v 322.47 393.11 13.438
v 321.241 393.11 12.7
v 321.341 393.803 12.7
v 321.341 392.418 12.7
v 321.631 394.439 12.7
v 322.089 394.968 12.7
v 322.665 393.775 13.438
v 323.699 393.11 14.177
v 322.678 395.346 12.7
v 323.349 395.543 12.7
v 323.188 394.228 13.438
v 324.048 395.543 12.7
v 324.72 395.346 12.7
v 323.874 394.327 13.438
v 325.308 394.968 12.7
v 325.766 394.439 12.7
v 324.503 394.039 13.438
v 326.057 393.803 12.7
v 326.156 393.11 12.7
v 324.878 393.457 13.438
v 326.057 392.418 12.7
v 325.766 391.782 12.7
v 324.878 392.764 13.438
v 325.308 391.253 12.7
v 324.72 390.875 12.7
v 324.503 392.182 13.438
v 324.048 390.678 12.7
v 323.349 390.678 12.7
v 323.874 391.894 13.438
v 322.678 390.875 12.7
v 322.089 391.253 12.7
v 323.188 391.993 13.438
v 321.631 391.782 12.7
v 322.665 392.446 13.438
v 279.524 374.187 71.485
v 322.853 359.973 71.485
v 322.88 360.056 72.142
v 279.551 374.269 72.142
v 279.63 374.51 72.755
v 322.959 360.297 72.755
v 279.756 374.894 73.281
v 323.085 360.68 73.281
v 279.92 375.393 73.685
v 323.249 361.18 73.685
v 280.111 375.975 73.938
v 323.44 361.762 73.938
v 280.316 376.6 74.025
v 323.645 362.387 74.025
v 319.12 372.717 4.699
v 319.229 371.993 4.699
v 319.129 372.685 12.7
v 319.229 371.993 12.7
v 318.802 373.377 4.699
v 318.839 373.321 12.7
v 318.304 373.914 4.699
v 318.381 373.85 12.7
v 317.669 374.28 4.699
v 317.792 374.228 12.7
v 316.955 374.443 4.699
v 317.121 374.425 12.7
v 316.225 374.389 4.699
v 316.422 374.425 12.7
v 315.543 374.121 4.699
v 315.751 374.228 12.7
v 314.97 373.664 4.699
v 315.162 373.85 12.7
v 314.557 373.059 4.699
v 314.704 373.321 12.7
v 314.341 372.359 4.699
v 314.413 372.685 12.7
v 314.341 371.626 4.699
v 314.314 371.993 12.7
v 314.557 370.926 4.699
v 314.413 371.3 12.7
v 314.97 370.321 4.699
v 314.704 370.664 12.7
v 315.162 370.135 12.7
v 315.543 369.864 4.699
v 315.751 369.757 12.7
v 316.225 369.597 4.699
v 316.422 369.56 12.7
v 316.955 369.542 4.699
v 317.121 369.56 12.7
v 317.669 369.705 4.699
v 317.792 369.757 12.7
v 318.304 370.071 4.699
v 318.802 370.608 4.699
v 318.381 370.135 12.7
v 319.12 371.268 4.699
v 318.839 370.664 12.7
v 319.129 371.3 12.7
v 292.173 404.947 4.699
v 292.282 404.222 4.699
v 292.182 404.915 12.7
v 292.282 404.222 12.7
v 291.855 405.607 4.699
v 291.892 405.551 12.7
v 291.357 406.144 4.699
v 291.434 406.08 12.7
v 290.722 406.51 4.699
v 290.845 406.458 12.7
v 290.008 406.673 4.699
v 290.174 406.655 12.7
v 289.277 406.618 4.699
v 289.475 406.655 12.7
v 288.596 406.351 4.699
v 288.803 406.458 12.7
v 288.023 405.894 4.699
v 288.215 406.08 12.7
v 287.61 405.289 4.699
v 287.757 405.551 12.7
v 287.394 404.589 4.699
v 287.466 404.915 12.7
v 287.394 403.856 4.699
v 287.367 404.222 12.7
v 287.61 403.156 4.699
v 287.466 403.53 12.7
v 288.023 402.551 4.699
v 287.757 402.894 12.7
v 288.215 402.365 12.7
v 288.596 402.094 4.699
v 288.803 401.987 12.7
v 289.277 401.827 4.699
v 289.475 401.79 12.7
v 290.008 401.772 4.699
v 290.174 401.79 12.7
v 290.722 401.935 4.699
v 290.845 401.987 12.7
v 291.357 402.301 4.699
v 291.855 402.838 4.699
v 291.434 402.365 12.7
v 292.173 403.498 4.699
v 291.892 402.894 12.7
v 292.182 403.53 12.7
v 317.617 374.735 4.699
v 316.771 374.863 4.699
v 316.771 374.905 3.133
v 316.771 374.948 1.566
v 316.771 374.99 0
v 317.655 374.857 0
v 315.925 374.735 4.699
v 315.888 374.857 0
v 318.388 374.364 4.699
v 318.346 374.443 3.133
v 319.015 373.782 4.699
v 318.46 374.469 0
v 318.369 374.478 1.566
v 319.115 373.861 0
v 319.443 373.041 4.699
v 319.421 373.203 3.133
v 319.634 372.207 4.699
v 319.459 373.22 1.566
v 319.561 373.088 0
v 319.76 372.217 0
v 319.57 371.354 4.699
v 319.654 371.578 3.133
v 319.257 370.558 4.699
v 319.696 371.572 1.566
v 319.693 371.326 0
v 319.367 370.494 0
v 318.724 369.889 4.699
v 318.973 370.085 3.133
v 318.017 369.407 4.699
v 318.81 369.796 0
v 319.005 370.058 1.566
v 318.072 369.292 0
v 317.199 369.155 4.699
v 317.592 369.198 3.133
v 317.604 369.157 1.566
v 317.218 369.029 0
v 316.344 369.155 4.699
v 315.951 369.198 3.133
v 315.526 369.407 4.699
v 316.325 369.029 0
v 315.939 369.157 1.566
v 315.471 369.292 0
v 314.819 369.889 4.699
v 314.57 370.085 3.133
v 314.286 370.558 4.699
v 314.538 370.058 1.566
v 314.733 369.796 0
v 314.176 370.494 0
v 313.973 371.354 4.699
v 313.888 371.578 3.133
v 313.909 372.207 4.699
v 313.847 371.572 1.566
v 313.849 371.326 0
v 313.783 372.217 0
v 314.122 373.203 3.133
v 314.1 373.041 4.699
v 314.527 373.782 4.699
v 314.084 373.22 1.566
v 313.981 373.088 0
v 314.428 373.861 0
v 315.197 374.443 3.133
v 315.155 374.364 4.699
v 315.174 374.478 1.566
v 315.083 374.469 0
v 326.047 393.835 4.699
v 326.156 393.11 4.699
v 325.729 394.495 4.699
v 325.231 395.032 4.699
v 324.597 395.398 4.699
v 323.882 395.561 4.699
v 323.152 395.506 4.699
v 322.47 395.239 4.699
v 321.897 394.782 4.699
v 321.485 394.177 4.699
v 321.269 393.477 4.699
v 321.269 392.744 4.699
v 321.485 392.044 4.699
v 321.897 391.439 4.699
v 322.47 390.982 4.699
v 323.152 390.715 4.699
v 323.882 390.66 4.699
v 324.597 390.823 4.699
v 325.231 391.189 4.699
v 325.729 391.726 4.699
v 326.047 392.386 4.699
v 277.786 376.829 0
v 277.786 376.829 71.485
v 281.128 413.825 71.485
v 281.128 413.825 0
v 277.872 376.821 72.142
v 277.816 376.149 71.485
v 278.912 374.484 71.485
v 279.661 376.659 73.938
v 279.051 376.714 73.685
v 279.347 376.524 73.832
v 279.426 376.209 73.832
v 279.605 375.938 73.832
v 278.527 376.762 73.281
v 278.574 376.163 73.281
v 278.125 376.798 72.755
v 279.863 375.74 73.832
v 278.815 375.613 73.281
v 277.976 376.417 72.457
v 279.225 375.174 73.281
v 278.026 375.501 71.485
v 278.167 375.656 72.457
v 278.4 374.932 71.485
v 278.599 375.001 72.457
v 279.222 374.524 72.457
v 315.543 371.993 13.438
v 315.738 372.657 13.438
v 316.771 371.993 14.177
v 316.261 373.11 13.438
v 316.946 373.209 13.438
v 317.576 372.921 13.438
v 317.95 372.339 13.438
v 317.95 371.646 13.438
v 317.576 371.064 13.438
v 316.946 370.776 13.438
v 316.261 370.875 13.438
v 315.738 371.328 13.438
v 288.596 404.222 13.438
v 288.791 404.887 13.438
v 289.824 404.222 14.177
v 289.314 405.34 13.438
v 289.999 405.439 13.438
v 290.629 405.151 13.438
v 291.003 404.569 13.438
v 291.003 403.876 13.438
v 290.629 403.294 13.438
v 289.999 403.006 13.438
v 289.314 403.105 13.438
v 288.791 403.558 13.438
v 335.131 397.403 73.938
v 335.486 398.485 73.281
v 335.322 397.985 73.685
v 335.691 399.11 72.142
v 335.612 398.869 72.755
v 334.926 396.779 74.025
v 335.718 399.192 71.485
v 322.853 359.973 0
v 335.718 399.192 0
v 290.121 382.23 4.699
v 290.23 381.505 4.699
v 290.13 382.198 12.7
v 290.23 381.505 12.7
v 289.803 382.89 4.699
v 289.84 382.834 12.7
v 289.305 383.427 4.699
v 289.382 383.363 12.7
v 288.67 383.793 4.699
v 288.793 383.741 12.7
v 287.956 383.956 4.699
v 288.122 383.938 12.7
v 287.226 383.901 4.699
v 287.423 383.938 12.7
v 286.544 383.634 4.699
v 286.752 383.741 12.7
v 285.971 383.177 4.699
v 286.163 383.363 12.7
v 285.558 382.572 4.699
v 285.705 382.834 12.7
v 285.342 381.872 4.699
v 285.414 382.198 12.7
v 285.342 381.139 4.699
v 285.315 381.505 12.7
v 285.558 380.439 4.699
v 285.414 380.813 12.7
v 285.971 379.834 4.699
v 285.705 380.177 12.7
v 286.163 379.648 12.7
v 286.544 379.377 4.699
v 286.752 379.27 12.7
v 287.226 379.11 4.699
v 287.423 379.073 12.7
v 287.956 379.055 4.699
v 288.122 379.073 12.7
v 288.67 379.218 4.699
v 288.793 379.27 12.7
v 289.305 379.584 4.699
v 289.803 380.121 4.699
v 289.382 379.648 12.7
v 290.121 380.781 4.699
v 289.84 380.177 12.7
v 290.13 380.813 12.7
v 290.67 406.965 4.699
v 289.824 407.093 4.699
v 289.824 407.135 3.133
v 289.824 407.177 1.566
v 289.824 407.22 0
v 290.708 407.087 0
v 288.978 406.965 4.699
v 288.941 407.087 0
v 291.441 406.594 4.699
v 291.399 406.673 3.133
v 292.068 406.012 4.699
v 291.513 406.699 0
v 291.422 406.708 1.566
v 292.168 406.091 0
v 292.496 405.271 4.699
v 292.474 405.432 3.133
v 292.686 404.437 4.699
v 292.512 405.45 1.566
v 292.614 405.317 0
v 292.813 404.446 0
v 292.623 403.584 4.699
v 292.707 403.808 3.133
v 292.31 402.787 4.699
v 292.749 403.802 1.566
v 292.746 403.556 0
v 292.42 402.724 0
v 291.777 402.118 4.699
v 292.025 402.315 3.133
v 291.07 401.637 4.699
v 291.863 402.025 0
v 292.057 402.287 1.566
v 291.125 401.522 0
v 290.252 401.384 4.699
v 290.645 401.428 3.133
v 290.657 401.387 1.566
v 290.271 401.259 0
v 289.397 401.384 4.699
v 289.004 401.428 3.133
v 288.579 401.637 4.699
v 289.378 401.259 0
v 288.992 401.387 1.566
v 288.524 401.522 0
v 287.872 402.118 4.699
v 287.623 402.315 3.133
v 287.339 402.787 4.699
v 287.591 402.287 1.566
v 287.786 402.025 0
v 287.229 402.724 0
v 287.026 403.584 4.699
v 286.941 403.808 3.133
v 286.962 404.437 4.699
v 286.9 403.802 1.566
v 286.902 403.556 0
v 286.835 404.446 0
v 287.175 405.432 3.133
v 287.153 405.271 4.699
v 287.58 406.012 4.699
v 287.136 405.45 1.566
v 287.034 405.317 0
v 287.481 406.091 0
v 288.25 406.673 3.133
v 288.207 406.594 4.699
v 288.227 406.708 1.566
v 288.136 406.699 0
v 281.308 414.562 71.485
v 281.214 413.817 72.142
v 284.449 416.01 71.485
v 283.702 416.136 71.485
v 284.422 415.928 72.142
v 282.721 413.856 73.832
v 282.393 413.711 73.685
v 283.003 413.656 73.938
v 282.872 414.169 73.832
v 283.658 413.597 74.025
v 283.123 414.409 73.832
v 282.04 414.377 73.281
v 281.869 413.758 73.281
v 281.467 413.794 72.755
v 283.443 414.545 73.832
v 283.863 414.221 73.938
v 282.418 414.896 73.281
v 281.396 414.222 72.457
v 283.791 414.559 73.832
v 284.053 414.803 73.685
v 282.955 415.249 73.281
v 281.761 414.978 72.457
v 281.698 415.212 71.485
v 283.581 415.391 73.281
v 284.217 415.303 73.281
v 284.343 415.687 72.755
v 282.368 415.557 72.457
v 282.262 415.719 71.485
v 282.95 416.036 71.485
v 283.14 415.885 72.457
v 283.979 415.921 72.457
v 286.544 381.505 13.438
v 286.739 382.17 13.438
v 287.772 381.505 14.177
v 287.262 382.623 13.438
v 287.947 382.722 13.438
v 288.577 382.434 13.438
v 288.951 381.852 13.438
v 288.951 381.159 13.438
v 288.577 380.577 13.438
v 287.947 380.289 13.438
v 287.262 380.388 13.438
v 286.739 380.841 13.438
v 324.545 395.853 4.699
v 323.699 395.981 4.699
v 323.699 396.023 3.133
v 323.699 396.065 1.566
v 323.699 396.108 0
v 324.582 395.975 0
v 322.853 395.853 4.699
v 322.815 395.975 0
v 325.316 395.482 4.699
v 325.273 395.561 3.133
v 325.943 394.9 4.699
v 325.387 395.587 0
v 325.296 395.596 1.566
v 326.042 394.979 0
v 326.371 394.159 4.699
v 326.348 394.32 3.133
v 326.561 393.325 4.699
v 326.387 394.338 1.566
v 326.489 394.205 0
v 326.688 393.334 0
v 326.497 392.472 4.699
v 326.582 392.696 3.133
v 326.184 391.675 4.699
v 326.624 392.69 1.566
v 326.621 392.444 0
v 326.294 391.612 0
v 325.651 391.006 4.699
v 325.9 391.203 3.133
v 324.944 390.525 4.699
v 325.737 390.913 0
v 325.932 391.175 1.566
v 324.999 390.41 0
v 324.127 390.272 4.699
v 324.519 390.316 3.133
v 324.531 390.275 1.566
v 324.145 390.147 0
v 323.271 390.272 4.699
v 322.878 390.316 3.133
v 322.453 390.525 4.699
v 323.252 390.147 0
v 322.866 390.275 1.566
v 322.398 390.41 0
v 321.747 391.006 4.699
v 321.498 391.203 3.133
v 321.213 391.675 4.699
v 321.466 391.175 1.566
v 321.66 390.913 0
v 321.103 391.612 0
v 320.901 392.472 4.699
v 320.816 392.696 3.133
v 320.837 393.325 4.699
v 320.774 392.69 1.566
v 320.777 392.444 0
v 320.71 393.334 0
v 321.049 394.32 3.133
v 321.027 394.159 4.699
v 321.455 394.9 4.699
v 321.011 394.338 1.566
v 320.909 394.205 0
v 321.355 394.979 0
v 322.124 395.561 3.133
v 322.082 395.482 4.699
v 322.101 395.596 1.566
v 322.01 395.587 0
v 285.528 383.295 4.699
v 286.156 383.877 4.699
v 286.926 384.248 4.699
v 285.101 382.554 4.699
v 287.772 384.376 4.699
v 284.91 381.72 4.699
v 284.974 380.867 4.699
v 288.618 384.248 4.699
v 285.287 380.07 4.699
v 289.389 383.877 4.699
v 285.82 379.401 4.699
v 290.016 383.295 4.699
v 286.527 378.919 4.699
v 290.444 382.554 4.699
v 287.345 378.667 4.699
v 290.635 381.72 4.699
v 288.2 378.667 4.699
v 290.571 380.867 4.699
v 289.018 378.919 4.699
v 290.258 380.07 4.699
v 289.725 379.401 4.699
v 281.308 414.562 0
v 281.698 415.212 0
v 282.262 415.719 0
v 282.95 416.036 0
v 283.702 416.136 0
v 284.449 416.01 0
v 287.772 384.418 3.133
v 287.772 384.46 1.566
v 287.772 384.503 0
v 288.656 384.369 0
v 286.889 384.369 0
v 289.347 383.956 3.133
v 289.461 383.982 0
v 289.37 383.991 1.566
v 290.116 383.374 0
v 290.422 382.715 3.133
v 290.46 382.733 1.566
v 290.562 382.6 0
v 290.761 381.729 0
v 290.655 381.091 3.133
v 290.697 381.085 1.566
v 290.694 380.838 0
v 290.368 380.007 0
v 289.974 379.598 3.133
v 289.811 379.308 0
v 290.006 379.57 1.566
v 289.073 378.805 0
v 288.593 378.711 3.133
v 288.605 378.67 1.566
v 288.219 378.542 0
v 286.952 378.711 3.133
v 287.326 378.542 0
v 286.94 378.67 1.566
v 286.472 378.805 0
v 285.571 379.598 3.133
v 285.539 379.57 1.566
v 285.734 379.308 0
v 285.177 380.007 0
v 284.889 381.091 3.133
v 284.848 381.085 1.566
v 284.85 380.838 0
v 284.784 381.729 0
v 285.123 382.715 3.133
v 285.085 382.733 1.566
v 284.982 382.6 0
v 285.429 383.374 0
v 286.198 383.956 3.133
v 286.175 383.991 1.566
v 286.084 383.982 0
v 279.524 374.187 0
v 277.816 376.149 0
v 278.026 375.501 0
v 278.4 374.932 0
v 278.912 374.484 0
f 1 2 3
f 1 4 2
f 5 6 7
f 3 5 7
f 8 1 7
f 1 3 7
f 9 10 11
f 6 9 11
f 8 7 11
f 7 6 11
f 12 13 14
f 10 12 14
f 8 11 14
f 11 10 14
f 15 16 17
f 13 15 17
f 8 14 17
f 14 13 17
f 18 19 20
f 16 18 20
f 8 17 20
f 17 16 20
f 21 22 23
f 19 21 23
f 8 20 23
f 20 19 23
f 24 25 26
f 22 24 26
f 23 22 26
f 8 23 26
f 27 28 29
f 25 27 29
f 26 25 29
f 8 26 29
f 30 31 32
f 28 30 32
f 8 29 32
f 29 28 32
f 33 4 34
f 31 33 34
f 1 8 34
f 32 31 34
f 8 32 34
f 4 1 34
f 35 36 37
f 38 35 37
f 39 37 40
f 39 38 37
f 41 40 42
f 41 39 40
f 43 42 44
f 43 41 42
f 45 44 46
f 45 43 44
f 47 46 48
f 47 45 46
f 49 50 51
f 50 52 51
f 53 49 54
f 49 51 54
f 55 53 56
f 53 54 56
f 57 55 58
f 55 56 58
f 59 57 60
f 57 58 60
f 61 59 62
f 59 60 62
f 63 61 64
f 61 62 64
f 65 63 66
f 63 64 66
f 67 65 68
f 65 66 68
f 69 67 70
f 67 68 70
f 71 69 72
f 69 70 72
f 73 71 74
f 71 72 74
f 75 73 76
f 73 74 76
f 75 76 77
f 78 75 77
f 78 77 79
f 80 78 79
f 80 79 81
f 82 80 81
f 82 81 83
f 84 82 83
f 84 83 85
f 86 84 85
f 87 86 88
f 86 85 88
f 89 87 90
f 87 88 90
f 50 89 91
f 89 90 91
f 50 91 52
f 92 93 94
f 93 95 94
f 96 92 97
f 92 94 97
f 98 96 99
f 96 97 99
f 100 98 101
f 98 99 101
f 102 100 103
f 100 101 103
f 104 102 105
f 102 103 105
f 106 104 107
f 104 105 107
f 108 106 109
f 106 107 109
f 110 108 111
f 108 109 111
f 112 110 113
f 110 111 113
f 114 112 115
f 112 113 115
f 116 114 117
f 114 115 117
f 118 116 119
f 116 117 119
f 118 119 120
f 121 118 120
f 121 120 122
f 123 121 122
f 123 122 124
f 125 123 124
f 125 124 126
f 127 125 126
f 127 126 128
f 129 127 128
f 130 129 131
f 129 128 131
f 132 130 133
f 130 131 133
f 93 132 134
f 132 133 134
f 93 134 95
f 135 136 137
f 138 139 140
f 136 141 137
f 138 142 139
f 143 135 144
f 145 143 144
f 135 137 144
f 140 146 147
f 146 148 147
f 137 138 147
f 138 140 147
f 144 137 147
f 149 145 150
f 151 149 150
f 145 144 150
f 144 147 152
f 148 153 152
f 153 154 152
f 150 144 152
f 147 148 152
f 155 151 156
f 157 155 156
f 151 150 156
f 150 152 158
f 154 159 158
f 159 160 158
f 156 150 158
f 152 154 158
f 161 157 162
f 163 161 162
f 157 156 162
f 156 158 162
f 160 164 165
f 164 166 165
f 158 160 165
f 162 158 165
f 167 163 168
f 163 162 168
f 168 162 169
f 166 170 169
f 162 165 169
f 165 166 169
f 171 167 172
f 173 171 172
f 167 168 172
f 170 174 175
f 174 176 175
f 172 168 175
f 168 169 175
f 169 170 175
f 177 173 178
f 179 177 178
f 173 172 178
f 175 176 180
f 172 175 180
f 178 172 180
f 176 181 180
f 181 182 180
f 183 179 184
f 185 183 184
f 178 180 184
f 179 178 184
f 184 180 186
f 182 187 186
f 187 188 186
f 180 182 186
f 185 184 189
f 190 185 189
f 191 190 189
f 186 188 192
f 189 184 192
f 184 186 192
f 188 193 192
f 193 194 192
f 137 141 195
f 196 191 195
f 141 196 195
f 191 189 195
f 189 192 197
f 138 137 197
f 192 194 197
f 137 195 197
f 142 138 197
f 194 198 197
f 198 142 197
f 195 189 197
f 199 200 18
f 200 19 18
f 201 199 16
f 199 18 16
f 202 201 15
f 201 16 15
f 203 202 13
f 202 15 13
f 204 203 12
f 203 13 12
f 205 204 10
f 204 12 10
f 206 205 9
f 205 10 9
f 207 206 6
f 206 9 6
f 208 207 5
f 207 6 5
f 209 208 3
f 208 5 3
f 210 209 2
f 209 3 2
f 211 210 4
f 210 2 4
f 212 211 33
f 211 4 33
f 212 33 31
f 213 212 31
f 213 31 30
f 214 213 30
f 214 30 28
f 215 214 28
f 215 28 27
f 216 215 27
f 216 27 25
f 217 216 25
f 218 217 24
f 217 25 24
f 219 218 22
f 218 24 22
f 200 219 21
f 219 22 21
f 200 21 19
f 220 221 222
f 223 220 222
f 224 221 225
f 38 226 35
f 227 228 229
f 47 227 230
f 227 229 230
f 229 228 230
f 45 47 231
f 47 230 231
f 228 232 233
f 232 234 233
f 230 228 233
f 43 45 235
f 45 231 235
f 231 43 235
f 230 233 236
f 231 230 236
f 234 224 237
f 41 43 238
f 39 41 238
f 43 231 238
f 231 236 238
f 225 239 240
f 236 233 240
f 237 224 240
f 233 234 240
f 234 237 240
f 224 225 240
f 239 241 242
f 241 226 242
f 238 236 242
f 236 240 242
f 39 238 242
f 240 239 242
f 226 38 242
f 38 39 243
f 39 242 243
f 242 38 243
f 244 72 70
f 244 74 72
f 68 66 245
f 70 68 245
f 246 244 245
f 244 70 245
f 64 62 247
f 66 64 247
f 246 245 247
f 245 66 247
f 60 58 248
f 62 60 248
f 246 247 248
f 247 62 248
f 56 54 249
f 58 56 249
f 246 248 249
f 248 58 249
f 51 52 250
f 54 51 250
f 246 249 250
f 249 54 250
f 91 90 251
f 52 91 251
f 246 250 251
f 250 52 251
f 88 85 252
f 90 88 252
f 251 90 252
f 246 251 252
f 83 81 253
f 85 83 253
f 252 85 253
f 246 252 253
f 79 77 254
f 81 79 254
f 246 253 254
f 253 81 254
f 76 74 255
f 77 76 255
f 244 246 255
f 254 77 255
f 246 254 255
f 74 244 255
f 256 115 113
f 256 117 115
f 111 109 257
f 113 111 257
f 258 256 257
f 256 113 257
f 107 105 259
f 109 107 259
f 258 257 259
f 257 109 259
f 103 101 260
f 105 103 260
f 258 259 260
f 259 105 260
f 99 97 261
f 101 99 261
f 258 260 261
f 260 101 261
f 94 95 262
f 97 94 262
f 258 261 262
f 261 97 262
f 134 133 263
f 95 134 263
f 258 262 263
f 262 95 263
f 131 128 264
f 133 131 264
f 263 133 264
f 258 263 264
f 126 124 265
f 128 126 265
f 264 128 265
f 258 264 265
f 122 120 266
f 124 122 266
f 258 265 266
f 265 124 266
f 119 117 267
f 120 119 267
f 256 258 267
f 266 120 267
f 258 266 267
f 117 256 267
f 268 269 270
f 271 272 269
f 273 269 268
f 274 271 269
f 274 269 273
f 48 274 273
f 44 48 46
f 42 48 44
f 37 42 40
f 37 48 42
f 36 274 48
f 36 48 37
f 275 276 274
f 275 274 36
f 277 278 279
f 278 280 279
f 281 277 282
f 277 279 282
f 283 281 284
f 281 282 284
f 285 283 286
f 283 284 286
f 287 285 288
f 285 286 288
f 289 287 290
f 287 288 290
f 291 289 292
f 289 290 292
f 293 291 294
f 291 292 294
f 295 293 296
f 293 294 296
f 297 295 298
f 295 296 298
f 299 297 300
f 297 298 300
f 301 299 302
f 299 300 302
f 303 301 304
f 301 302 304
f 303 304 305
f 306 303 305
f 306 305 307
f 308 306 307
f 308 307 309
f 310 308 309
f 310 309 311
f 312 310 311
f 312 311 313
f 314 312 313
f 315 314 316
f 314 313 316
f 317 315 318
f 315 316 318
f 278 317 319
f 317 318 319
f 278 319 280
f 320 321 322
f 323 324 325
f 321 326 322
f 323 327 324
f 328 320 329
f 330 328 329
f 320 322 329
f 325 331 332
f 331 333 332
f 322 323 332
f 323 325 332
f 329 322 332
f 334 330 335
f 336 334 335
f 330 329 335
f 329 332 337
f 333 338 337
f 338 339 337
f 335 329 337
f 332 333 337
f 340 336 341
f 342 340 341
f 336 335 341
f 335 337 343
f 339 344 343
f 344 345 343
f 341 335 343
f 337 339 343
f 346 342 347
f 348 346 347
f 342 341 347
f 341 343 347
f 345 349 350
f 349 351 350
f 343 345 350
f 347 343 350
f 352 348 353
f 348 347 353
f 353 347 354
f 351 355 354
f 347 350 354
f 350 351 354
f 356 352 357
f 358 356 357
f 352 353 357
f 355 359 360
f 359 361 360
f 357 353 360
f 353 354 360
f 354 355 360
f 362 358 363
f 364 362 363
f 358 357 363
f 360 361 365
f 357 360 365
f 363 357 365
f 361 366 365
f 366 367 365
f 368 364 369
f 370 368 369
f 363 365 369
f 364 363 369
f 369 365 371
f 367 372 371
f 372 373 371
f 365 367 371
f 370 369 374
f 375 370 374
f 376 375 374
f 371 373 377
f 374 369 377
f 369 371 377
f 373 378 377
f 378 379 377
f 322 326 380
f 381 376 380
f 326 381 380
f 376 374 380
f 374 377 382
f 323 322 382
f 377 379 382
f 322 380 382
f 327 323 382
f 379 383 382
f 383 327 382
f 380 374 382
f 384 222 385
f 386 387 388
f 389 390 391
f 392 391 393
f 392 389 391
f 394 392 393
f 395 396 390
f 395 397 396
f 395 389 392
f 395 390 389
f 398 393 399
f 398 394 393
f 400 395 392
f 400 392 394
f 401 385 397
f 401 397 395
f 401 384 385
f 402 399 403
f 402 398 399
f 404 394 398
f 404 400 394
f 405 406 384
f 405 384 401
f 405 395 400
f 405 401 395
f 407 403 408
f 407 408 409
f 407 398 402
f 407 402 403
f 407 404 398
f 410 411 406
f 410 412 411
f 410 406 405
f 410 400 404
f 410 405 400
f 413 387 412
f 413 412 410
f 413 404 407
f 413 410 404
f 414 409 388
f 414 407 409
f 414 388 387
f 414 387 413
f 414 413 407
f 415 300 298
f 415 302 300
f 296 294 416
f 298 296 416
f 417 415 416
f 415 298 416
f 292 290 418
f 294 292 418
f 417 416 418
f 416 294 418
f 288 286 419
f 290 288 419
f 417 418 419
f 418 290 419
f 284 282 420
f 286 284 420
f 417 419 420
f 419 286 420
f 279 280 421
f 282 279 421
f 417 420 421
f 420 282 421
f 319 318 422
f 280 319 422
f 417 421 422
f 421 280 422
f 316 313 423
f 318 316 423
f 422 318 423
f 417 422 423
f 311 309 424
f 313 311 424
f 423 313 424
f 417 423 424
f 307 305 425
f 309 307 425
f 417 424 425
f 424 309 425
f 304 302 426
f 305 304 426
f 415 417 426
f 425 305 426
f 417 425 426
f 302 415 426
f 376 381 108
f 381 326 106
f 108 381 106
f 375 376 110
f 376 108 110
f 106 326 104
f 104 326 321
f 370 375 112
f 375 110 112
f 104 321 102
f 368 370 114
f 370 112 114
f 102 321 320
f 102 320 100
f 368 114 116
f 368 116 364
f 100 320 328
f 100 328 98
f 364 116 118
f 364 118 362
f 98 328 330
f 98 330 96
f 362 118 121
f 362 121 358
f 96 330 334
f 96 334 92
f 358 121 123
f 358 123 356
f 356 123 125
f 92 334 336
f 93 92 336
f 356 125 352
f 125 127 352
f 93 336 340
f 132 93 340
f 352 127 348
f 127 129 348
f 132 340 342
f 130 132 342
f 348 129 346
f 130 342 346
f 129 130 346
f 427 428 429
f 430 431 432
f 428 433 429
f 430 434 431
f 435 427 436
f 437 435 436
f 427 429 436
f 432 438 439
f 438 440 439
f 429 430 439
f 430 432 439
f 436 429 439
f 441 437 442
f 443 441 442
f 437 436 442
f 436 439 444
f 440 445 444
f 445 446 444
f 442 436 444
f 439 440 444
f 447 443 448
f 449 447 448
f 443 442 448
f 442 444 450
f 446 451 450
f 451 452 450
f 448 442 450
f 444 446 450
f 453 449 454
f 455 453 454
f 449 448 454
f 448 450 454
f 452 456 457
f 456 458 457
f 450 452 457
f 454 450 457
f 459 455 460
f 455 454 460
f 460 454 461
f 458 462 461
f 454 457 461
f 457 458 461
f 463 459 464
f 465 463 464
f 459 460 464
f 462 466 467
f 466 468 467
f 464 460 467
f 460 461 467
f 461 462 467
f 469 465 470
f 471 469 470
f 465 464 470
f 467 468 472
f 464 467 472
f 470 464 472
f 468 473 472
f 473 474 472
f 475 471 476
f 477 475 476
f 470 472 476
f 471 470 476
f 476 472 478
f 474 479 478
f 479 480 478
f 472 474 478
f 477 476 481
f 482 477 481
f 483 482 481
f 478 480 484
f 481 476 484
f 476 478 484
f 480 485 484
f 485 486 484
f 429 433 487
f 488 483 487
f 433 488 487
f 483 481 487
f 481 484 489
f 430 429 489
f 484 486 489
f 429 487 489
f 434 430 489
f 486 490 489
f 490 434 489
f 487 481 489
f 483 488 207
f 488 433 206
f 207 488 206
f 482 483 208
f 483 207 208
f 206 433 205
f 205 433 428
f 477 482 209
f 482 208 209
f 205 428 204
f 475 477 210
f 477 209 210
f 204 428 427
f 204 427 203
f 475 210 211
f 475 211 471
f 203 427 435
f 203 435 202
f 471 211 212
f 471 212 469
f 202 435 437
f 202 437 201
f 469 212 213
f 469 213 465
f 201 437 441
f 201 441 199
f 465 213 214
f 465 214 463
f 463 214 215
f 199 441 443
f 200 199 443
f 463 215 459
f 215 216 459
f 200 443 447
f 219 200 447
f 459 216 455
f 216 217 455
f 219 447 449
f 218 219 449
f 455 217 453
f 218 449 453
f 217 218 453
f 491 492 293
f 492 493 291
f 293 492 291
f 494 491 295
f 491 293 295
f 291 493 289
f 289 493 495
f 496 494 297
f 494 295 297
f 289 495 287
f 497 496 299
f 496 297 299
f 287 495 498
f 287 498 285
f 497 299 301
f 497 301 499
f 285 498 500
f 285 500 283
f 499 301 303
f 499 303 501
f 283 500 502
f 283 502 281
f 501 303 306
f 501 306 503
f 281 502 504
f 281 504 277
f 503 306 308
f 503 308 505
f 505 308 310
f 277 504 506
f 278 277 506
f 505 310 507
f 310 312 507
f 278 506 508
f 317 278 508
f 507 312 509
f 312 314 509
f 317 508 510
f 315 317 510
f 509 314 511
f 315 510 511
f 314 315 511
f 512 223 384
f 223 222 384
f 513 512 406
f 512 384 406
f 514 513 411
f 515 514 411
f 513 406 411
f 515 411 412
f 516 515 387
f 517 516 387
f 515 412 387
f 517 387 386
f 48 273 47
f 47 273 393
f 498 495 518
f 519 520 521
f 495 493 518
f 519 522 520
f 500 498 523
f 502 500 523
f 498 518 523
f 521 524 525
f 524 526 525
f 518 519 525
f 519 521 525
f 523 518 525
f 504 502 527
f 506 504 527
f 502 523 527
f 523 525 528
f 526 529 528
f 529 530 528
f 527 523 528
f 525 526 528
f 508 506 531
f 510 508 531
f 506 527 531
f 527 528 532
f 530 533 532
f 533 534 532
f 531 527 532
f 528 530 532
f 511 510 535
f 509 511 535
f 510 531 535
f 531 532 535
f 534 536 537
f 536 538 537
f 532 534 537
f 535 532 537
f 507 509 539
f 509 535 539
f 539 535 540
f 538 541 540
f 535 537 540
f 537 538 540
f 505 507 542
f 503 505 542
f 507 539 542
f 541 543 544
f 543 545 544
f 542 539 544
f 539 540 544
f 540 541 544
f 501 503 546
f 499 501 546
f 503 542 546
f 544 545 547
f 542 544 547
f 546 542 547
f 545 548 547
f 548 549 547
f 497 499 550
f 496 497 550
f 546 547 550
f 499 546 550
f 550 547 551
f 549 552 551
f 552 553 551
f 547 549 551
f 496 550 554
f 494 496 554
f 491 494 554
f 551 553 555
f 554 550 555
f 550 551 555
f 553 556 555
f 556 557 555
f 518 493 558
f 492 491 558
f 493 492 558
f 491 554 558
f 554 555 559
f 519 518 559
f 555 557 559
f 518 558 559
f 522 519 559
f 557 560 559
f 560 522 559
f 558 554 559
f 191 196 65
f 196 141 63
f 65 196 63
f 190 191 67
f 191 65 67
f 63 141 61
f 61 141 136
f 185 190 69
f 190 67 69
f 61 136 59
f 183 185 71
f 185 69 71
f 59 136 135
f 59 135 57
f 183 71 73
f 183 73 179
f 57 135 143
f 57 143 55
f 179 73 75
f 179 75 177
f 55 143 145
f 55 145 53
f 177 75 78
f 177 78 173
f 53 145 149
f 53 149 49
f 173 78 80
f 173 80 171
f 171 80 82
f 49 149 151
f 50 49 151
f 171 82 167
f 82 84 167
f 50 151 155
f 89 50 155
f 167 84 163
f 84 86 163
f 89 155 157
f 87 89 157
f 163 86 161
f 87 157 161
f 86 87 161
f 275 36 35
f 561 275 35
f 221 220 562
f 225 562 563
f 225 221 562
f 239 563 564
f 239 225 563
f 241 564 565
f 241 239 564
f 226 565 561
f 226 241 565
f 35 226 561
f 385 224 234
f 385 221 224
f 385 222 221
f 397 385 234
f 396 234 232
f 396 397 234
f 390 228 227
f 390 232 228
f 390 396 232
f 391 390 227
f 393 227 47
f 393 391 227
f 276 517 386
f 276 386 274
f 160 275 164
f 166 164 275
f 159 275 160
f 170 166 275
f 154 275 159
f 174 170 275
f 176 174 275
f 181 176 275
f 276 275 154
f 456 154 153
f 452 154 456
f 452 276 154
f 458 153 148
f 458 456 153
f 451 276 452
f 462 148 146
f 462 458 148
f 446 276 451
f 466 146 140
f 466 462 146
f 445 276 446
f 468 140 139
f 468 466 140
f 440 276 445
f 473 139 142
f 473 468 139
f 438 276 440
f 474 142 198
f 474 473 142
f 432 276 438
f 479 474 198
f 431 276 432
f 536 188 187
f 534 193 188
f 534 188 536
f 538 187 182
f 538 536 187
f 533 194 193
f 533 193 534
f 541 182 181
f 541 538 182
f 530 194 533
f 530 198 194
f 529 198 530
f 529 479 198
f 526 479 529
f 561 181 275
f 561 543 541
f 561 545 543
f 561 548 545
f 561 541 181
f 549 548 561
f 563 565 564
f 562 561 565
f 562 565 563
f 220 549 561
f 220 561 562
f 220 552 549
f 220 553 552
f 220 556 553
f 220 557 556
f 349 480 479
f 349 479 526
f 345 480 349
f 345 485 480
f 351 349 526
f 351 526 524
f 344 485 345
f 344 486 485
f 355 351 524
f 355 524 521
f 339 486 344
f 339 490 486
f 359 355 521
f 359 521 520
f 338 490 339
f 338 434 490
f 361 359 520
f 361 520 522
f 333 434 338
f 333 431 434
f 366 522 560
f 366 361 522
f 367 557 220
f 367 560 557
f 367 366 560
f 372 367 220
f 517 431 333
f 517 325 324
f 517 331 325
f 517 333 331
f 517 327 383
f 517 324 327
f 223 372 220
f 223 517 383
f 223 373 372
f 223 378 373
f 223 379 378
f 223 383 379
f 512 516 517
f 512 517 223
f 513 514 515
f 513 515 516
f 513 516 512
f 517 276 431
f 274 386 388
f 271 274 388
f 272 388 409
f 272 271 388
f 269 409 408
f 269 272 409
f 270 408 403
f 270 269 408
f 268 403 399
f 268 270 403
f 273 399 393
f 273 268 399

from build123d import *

# Parameters (mm, degrees)
BOSS_EXTRUDE1_DEPTH       = 74.025
FILLET1_R                 = 2.54
HOLE1_AT_2_COUNT          = 2
HOLE1_AT_2_PITCH          = 35.650433853
HOLE1_AT_3_COUNT          = 2
HOLE1_AT_3_PITCH          = 37.7542539
HOLE1_AT_4_COUNT          = 2
HOLE1_AT_4_PITCH          = 22.225
F_8_CLEARANCE_HOLE1_D     = 4.9149
F_8_CLEARANCE_HOLE1_DEPTH = 12.7
F_8_CLEARANCE_HOLE1_TIP   = 1.476584928


with BuildPart() as part:
    # Sketch1 → Boss-Extrude1 (new body)
    with BuildSketch(Plane.XY):
        Polygon((277.604402796, 374.816405204), (281.415155825, 417.005352091), (335.71810759, 399.192100573), (322.852981494, 359.973302076), align=None)
    extrude(amount=BOSS_EXTRUDE1_DEPTH)

    # Fillet1
    fillet1_edges = [part.edges().sort_by_distance(p)[0] for p in [
        (281.415155825, 417.005352091, 37.0125),
        (279.509779311, 395.910878647, 74.025),
        (300.228692145, 367.39485364, 74.025),
        (308.566631708, 408.098726332, 74.025),
        (277.604402796, 374.816405204, 37.0125),
    ]]
    fillet(fillet1_edges, radius=FILLET1_R)

    # Sketch3 → Hole1 (revolve, cut)
    with BuildSketch(Plane(origin=(323.698740376, 393.110483865, 0), x_dir=(0, 1, 0), z_dir=(1, 0, 0))):
        Polygon((0, 0), (0, 4.699), (2.8702, 4.699), (2.9972, 0), align=None)
    hole1 = revolve(axis=Axis((323.698740376, 393.110483865, 110), (0, 0, -1)), mode=Mode.SUBTRACT)

    # Hole1 at 2: Hole1 ×2
    with Locations(*[Vector(-0.950182883, 0.31169294, 0) * (i * HOLE1_AT_2_PITCH) for i in range(1, HOLE1_AT_2_COUNT)]):
        add(hole1, mode=Mode.SUBTRACT)

    # Hole1 at 3: Hole1 ×2
    with Locations(*[Vector(-0.951584848, -0.307386202, 0) * (i * HOLE1_AT_3_PITCH) for i in range(1, HOLE1_AT_3_COUNT)]):
        add(hole1, mode=Mode.SUBTRACT)

    # Hole1 at 4: Hole1 ×2
    with Locations(*[Vector(-0.31169294, -0.950182883, 0) * (i * HOLE1_AT_4_PITCH) for i in range(1, HOLE1_AT_4_COUNT)]):
        add(hole1, mode=Mode.SUBTRACT)

    # #8 Clearance Hole1
    with Locations(Plane(origin=(0, 0, 0), x_dir=(-1, 0, 0), z_dir=(0, 0, -1))):
        with Locations((-323.698740376, 393.110483865), (-289.824308357, 404.222472403), (-287.772364418, 381.505347156), (-316.771364786, 371.99266929)):
            Hole(F_8_CLEARANCE_HOLE1_D / 2, depth=F_8_CLEARANCE_HOLE1_DEPTH)
            with Locations((0, 0, -(F_8_CLEARANCE_HOLE1_DEPTH + F_8_CLEARANCE_HOLE1_TIP / 2))):  # 118° drill point
                Cone(0, F_8_CLEARANCE_HOLE1_D / 2, F_8_CLEARANCE_HOLE1_TIP, mode=Mode.SUBTRACT)


solid = part.part
